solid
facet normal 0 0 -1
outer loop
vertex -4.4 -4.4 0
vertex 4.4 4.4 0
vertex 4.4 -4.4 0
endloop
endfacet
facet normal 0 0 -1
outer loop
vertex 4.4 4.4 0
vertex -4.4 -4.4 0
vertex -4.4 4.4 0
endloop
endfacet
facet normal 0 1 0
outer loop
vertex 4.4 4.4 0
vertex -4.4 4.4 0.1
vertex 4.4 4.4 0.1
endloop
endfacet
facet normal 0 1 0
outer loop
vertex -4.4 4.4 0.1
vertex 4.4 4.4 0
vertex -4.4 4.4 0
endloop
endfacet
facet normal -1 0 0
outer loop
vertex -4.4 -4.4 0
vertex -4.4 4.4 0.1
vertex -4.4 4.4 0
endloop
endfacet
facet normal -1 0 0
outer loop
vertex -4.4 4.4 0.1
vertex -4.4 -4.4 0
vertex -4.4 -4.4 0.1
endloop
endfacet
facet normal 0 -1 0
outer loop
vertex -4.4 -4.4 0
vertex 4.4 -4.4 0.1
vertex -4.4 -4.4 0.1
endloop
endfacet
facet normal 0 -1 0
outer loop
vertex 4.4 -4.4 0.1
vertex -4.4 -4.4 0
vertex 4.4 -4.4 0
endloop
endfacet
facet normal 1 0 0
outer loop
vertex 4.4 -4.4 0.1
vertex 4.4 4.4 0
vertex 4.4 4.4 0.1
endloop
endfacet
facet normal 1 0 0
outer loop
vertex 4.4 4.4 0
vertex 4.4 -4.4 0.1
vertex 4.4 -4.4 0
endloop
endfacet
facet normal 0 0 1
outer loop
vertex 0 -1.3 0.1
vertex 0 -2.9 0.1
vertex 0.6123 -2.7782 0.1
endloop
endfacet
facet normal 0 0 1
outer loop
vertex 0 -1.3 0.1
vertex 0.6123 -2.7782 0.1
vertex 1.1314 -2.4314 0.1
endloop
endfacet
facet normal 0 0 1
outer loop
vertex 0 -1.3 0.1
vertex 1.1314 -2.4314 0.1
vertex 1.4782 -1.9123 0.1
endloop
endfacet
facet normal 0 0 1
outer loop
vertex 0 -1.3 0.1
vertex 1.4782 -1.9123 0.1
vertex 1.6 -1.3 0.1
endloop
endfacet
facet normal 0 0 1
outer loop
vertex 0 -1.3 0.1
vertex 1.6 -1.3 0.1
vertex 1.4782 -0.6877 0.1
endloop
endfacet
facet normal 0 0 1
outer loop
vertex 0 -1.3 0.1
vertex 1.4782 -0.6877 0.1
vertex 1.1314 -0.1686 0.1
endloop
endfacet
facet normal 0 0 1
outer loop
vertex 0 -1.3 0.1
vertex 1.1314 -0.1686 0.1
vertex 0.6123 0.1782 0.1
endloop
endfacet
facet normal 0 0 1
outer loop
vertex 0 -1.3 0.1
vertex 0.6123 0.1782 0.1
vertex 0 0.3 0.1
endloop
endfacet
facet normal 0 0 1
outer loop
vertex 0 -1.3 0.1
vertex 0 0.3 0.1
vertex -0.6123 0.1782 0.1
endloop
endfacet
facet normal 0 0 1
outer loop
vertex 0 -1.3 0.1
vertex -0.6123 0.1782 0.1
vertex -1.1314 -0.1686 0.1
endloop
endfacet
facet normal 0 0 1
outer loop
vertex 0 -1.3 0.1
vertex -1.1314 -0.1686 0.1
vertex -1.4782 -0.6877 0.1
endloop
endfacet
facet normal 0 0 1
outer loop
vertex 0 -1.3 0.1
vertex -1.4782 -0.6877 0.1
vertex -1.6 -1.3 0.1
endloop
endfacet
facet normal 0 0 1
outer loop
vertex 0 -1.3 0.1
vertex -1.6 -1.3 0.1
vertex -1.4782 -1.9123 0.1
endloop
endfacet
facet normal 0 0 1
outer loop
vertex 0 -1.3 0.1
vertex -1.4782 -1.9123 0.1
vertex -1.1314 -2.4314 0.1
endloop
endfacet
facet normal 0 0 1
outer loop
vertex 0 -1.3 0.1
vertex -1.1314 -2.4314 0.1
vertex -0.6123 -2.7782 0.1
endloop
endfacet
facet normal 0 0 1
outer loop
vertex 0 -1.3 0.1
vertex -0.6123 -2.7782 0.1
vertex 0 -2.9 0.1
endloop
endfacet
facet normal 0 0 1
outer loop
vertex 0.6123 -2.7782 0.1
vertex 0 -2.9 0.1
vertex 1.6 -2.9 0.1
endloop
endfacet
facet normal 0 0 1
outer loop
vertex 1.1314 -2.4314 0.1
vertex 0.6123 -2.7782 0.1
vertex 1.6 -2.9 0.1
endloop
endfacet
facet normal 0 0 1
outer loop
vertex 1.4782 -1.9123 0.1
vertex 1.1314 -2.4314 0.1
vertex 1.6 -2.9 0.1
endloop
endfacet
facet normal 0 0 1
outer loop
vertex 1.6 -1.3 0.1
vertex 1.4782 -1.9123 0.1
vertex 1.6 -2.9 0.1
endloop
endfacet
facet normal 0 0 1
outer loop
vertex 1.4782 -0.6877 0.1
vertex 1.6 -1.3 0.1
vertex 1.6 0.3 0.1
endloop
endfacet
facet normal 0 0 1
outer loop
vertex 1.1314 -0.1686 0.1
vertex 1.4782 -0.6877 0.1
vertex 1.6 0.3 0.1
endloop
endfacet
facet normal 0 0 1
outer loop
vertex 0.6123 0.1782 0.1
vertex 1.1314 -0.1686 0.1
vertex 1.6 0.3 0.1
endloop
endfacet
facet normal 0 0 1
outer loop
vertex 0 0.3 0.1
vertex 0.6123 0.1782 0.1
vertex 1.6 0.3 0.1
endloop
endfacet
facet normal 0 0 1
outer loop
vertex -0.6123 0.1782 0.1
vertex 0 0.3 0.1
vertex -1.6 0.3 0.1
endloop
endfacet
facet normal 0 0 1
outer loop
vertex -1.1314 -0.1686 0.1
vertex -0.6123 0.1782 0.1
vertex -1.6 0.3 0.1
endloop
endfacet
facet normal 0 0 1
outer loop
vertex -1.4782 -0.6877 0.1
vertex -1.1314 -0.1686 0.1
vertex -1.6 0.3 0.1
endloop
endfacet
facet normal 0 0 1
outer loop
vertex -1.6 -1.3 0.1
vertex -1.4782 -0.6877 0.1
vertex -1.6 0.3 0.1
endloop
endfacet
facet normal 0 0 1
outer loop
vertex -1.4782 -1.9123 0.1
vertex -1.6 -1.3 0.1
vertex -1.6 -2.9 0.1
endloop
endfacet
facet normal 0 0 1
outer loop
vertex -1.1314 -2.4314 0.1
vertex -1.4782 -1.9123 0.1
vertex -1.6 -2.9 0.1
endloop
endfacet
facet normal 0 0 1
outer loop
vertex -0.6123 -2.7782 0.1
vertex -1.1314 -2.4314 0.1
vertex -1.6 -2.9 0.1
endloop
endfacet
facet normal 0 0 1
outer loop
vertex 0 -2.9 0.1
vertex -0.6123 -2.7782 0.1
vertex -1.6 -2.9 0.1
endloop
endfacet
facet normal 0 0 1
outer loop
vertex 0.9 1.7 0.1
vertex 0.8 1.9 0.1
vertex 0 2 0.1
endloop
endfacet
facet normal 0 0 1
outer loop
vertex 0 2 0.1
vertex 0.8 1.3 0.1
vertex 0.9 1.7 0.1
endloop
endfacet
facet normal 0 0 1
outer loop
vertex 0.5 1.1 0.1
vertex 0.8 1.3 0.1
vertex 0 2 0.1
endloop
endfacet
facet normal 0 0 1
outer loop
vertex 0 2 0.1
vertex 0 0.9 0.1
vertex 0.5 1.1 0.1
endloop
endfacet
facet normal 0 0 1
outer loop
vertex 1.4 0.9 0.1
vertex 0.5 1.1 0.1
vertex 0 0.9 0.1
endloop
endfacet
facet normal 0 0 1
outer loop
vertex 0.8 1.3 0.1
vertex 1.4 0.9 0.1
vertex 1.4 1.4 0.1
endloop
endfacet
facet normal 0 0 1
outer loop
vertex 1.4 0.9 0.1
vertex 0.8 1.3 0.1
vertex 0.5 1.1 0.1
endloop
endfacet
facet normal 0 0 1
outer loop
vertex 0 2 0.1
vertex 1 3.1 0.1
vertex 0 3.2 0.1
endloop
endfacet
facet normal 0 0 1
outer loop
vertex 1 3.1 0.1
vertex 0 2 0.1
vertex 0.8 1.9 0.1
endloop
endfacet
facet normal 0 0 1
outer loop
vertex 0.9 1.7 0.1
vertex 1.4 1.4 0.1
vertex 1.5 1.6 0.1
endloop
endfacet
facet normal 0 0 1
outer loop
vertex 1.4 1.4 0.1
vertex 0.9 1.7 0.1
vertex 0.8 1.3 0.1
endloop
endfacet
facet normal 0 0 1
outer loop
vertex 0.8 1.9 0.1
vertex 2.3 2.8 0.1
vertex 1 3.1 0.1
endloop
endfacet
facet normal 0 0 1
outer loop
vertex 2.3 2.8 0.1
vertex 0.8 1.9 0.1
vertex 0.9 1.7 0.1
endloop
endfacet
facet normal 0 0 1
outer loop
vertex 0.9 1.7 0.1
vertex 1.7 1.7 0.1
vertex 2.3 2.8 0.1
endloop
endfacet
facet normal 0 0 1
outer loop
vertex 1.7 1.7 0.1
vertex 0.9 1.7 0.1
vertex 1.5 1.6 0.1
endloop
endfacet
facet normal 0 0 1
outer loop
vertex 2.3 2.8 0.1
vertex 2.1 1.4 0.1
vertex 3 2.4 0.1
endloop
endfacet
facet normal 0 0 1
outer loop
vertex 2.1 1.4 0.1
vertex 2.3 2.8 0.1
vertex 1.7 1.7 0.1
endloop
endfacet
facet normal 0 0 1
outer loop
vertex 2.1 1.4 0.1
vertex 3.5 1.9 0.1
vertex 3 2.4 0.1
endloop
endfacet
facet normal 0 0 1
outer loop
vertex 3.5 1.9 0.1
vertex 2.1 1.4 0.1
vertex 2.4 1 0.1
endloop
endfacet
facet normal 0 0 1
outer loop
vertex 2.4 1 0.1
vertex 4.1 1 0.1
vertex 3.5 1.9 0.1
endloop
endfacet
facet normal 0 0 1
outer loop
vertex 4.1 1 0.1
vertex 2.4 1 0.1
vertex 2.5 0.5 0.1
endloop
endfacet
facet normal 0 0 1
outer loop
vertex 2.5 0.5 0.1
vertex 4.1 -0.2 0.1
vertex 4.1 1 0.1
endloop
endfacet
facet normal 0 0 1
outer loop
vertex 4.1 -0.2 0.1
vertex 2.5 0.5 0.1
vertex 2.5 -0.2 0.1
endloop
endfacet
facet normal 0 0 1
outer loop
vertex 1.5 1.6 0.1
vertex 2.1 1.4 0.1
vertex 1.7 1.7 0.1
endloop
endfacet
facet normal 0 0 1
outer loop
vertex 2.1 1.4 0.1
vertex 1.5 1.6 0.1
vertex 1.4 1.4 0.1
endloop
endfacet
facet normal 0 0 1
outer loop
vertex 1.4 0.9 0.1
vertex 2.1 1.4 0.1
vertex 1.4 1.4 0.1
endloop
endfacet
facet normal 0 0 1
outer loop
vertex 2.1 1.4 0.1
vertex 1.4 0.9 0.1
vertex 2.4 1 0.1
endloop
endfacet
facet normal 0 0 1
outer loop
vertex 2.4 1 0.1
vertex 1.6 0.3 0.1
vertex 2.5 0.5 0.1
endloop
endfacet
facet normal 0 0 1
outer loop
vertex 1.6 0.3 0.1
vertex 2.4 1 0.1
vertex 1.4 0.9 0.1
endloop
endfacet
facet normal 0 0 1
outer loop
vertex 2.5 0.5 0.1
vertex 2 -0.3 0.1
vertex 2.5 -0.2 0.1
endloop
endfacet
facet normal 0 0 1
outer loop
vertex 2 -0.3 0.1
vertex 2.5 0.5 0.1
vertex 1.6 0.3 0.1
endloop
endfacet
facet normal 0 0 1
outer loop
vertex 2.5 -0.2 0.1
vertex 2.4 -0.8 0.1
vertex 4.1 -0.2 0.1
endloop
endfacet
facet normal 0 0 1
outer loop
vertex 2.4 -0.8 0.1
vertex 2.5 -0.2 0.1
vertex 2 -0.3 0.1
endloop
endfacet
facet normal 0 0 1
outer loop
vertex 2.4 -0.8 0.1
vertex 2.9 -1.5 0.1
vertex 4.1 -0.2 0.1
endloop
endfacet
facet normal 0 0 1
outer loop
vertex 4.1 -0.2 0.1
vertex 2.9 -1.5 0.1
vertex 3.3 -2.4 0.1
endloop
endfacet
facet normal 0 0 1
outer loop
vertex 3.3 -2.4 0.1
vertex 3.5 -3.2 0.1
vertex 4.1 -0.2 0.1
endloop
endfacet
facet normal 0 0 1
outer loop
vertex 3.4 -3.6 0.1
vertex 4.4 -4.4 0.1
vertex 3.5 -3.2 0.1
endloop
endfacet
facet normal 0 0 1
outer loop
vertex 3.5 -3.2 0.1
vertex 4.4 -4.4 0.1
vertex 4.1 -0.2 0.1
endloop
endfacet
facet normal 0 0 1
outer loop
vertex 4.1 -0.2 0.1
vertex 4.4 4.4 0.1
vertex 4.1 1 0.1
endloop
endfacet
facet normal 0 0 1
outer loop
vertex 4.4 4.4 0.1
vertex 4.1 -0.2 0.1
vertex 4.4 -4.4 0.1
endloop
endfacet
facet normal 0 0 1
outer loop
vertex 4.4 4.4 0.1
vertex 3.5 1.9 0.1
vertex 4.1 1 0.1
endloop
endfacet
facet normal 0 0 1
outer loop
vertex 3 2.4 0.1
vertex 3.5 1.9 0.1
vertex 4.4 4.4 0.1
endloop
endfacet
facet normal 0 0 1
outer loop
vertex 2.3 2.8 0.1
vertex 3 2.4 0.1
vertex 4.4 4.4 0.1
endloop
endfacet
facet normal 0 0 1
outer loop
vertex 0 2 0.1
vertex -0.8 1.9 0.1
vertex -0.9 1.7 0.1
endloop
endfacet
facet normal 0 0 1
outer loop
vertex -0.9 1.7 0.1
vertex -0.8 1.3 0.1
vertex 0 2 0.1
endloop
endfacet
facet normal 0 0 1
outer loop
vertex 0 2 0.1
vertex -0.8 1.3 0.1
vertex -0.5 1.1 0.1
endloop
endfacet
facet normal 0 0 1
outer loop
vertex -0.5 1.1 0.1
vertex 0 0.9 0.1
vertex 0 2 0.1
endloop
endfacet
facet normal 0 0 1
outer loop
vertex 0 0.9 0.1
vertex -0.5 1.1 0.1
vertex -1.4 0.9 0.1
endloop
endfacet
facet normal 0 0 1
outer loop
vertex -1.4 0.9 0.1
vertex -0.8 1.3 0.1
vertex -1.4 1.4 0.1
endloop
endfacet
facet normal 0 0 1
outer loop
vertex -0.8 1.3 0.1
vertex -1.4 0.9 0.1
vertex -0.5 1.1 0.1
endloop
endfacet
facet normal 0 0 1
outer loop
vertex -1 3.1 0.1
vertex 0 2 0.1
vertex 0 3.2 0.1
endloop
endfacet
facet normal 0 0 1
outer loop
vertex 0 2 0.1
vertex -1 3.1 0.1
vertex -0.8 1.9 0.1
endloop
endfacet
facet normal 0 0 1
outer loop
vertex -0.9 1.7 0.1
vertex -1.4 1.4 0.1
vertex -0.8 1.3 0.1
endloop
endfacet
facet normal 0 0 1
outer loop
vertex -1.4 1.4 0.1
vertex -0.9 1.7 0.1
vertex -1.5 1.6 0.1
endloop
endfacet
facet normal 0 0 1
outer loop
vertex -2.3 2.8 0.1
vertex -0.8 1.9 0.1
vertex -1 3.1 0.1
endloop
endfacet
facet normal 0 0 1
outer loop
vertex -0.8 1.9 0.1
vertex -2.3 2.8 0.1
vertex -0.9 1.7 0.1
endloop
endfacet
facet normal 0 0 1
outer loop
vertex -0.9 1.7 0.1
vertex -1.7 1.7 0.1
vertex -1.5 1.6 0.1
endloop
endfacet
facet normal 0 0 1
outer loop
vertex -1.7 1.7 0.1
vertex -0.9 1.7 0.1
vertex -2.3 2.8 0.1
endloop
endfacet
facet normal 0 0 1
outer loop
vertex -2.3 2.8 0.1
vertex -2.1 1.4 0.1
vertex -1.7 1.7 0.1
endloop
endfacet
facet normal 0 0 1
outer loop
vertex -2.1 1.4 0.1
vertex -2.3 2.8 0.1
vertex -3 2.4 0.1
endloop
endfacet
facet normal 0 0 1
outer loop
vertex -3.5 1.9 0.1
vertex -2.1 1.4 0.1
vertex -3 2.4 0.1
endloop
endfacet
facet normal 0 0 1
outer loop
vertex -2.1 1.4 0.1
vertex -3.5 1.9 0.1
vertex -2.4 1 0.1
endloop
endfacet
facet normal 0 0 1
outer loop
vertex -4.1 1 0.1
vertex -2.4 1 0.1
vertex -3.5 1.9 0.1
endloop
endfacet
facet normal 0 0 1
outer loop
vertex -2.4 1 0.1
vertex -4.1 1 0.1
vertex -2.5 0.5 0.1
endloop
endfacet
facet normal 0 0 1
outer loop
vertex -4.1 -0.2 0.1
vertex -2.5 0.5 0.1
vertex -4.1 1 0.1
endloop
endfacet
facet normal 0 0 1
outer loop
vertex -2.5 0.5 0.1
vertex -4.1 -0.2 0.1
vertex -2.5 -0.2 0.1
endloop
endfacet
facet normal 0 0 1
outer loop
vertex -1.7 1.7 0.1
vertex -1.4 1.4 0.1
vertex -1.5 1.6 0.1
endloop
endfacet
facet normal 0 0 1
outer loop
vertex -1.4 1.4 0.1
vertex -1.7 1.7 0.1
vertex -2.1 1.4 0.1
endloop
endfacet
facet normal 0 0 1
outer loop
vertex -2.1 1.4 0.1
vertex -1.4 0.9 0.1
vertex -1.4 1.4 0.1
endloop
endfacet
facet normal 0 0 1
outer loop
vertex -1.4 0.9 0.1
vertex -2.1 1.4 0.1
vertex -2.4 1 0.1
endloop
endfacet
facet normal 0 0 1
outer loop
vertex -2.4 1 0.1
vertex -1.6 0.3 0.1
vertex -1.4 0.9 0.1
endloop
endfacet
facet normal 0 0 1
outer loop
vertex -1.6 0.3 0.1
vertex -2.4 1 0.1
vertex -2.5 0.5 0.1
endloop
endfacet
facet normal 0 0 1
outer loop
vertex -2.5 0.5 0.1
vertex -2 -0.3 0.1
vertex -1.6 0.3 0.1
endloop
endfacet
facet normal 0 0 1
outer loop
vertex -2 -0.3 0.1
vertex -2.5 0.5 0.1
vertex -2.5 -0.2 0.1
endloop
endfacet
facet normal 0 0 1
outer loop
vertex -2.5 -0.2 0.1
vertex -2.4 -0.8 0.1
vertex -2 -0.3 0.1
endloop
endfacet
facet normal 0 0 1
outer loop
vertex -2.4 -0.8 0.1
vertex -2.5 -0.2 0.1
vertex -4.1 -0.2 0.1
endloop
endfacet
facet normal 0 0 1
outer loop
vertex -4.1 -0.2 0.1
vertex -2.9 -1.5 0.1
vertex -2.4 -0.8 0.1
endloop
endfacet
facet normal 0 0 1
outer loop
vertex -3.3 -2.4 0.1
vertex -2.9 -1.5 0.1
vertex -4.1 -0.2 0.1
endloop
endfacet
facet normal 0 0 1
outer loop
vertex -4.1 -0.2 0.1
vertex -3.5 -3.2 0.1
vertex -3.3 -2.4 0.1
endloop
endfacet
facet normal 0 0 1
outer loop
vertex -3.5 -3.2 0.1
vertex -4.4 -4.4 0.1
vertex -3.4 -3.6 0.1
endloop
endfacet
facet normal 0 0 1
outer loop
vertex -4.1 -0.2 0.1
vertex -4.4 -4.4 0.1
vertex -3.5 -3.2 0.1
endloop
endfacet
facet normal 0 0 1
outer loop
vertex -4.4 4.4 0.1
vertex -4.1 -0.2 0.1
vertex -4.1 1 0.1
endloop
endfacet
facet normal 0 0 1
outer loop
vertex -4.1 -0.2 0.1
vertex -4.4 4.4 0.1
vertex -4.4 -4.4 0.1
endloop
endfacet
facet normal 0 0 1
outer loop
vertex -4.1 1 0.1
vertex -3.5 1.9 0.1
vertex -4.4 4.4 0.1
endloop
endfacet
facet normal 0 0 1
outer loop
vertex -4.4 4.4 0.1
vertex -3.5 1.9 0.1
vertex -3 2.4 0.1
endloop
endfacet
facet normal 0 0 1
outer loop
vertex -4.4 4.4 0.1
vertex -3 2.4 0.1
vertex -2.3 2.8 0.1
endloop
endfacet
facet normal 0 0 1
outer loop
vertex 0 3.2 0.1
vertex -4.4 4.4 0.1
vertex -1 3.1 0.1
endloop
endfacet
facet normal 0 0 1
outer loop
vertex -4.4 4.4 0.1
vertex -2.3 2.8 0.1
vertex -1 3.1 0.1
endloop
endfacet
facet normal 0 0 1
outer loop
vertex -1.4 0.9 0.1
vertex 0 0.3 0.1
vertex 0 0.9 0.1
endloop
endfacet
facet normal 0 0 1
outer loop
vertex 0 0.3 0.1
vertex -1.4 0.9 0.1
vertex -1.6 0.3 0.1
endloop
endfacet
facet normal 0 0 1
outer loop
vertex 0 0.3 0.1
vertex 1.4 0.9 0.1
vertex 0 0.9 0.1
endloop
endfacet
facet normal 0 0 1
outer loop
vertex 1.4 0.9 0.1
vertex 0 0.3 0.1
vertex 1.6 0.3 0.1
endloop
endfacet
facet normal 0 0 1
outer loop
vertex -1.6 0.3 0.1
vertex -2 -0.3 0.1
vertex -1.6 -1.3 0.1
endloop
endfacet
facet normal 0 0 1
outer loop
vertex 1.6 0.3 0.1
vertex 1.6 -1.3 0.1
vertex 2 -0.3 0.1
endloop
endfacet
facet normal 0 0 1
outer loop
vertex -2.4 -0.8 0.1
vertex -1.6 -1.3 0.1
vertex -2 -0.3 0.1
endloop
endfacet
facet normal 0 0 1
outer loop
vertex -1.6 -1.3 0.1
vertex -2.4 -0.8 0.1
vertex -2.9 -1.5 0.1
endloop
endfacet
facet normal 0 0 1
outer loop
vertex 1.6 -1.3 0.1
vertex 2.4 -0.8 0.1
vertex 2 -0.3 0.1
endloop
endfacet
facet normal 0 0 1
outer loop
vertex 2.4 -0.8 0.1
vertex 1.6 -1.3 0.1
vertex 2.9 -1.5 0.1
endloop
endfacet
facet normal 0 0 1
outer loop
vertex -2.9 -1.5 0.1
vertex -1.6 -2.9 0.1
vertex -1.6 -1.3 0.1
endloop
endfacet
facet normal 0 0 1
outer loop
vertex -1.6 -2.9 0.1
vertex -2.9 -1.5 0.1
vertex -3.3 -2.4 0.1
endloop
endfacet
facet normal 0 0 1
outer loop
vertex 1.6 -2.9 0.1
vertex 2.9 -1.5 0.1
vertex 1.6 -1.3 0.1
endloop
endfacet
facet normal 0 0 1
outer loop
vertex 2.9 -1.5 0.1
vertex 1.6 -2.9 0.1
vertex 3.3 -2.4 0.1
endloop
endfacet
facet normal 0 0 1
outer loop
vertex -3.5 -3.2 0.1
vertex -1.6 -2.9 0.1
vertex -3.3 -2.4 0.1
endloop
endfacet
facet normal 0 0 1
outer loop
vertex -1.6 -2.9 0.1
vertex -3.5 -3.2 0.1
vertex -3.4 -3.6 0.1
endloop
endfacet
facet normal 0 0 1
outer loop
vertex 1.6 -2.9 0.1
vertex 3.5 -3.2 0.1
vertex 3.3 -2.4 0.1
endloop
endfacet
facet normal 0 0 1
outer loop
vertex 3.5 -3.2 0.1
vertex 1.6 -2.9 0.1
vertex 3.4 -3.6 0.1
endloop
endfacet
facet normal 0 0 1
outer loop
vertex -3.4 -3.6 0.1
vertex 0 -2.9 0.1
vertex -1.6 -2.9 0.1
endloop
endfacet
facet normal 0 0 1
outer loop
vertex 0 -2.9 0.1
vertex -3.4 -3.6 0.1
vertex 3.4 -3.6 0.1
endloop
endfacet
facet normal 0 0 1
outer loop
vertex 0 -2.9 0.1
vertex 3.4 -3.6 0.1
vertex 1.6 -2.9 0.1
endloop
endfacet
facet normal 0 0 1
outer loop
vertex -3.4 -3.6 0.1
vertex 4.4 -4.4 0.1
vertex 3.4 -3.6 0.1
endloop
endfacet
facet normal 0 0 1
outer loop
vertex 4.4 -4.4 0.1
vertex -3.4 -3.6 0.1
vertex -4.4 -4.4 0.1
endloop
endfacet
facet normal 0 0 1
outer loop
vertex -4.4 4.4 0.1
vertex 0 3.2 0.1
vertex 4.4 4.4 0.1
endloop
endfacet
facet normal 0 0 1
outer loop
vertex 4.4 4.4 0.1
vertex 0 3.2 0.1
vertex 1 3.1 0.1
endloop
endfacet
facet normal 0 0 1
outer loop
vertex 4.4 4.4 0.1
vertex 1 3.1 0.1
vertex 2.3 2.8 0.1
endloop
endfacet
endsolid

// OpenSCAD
// file: ../p/4-4edge.scad
use <../lib.scad>
$fa=1; $fs=0.2;
function ldraw_lib__4_4edge(realsolid=false) = [
// 0 Circle 1.0
// 0 Name: 4-4edge.dat
// 0 Author: James Jessiman
// 0 !LDRAW_ORG Primitive UPDATE 2017-01
// 0 !LICENSE Licensed under CC BY 2.0 and CC BY 4.0 : see CAreadme.txt
// 
// 0 BFC CERTIFY CCW
  [0,"BFC","CERTIFY"],
  [0,"BFC","CCW"],
// 
// 0 !HISTORY 1998-12-15 [PTadmin] Official Update 1998-10
// 0 !HISTORY 2005-12-28 [PTadmin] Official Update 2005-01
// 0 !HISTORY 2007-06-24 [PTadmin] Header formatted for Contributor Agreement
// 0 !HISTORY 2008-07-01 [PTadmin] Official Update 2008-01
// 0 !HISTORY 2017-01-15 [Steffen] BFCed
// 0 !HISTORY 2017-12-30 [PTadmin] Official Update 2017-01
// 
// 
// 2 24 1 0 0 0.9239 0 0.3827
  [2,24,1,0,0,0.9239,0,0.3827],
// 2 24 0.9239 0 0.3827 0.7071 0 0.7071
  [2,24,0.9239,0,0.3827,0.7071,0,0.7071],
// 2 24 0.7071 0 0.7071 0.3827 0 0.9239
  [2,24,0.7071,0,0.7071,0.3827,0,0.9239],
// 2 24 0.3827 0 0.9239 0 0 1
  [2,24,0.3827,0,0.9239,0,0,1],
// 2 24 0 0 1 -0.3827 0 0.9239
  [2,24,0,0,1,-0.3827,0,0.9239],
// 2 24 -0.3827 0 0.9239 -0.7071 0 0.7071
  [2,24,-0.3827,0,0.9239,-0.7071,0,0.7071],
// 2 24 -0.7071 0 0.7071 -0.9239 0 0.3827
  [2,24,-0.7071,0,0.7071,-0.9239,0,0.3827],
// 2 24 -0.9239 0 0.3827 -1 0 -0
  [2,24,-0.9239,0,0.3827,-1,0,-0],
// 2 24 -1 0 -0 -0.9239 0 -0.3827
  [2,24,-1,0,-0,-0.9239,0,-0.3827],
// 2 24 -0.9239 0 -0.3827 -0.7071 0 -0.7071
  [2,24,-0.9239,0,-0.3827,-0.7071,0,-0.7071],
// 2 24 -0.7071 0 -0.7071 -0.3827 0 -0.9239
  [2,24,-0.7071,0,-0.7071,-0.3827,0,-0.9239],
// 2 24 -0.3827 0 -0.9239 0 0 -1
  [2,24,-0.3827,0,-0.9239,0,0,-1],
// 2 24 0 0 -1 0.3827 0 -0.9239
  [2,24,0,0,-1,0.3827,0,-0.9239],
// 2 24 0.3827 0 -0.9239 0.7071 0 -0.7071
  [2,24,0.3827,0,-0.9239,0.7071,0,-0.7071],
// 2 24 0.7071 0 -0.7071 0.9239 0 -0.3827
  [2,24,0.7071,0,-0.7071,0.9239,0,-0.3827],
// 2 24 0.9239 0 -0.3827 1 0 0
  [2,24,0.9239,0,-0.3827,1,0,0],
];
module ldraw_lib__4_4edge(step=0, col=false, unit=2/5, alt=false, line=0.2, solid=!$preview)
    makepoly(ldraw_lib__4_4edge(solid), step=step, col=col, unit=unit, alt=alt, line=line, solid=solid);
ldraw_lib__4_4edge(line=0.2);
// file: ../p/4-4cyli.scad
use <../lib.scad>
$fa=1; $fs=0.2;
function ldraw_lib__4_4cyli(realsolid=false) = [
// 0 Cylinder 1.0
// 0 Name: 4-4cyli.dat
// 0 Author: James Jessiman
// 0 !LDRAW_ORG Primitive UPDATE 2005-01
// 0 !LICENSE Licensed under CC BY 2.0 and CC BY 4.0 : see CAreadme.txt
// 
// 0 BFC CERTIFY CCW
  [0,"BFC","CERTIFY"],
  [0,"BFC","CCW"],
// 
// 0 !HISTORY 1998-12-15 [PTadmin] Official Update 1998-10
// 0 !HISTORY 2002-03-23 [sbliss] Added BFC statement; merged headers from files in distributions LDraw 0.27 and Complete.
// 0 !HISTORY 2002-04-25 [PTadmin] Official Update 2002-02
// 0 !HISTORY 2004-12-14 [guyvivan] BFC CCW
// 0 !HISTORY 2005-12-28 [PTadmin] Official Update 2005-01
// 0 !HISTORY 2007-06-24 [PTadmin] Header formatted for Contributor Agreement
// 0 !HISTORY 2008-07-01 [PTadmin] Official Update 2008-01
// 
// 
// 4 16 1 1 0 0.9239 1 0.3827 0.9239 0 0.3827 1 0 0
  [4,16,1,1,0,0.9239,1,0.3827,0.9239,0,0.3827,1,0,0],
// 5 24 1 0 0 1 1 0 0.9239 0 0.3827 0.9239 0 -0.3827
  [5,24,1,0,0,1,1,0,0.9239,0,0.3827,0.9239,0,-0.3827],
// 4 16 0.9239 1 0.3827 0.7071 1 0.7071 0.7071 0 0.7071 0.9239 0 0.3827
  [4,16,0.9239,1,0.3827,0.7071,1,0.7071,0.7071,0,0.7071,0.9239,0,0.3827],
// 5 24 0.9239 0 0.3827 0.9239 1 0.3827 0.7071 0 0.7071 1 0 0
  [5,24,0.9239,0,0.3827,0.9239,1,0.3827,0.7071,0,0.7071,1,0,0],
// 4 16 0.7071 1 0.7071 0.3827 1 0.9239 0.3827 0 0.9239 0.7071 0 0.7071
  [4,16,0.7071,1,0.7071,0.3827,1,0.9239,0.3827,0,0.9239,0.7071,0,0.7071],
// 5 24 0.7071 0 0.7071 0.7071 1 0.7071 0.3827 0 0.9239 0.9239 0 0.3827
  [5,24,0.7071,0,0.7071,0.7071,1,0.7071,0.3827,0,0.9239,0.9239,0,0.3827],
// 4 16 0.3827 1 0.9239 0 1 1 0 0 1 0.3827 0 0.9239
  [4,16,0.3827,1,0.9239,0,1,1,0,0,1,0.3827,0,0.9239],
// 5 24 0.3827 0 0.9239 0.3827 1 0.9239 0 0 1 0.7071 0 0.7071
  [5,24,0.3827,0,0.9239,0.3827,1,0.9239,0,0,1,0.7071,0,0.7071],
// 4 16 0 1 1 -0.3827 1 0.9239 -0.3827 0 0.9239 0 0 1
  [4,16,0,1,1,-0.3827,1,0.9239,-0.3827,0,0.9239,0,0,1],
// 5 24 0 0 1 0 1 1 -0.3827 0 0.9239 0.3827 0 0.9239
  [5,24,0,0,1,0,1,1,-0.3827,0,0.9239,0.3827,0,0.9239],
// 4 16 -0.3827 1 0.9239 -0.7071 1 0.7071 -0.7071 0 0.7071 -0.3827 0 0.9239
  [4,16,-0.3827,1,0.9239,-0.7071,1,0.7071,-0.7071,0,0.7071,-0.3827,0,0.9239],
// 5 24 -0.3827 0 0.9239 -0.3827 1 0.9239 -0.7071 0 0.7071 0 0 1
  [5,24,-0.3827,0,0.9239,-0.3827,1,0.9239,-0.7071,0,0.7071,0,0,1],
// 4 16 -0.7071 1 0.7071 -0.9239 1 0.3827 -0.9239 0 0.3827 -0.7071 0 0.7071
  [4,16,-0.7071,1,0.7071,-0.9239,1,0.3827,-0.9239,0,0.3827,-0.7071,0,0.7071],
// 5 24 -0.7071 0 0.7071 -0.7071 1 0.7071 -0.9239 0 0.3827 -0.3827 0 0.9239
  [5,24,-0.7071,0,0.7071,-0.7071,1,0.7071,-0.9239,0,0.3827,-0.3827,0,0.9239],
// 4 16 -0.9239 1 0.3827 -1 1 0 -1 0 0 -0.9239 0 0.3827
  [4,16,-0.9239,1,0.3827,-1,1,0,-1,0,0,-0.9239,0,0.3827],
// 5 24 -0.9239 0 0.3827 -0.9239 1 0.3827 -1 0 0 -0.7071 0 0.7071
  [5,24,-0.9239,0,0.3827,-0.9239,1,0.3827,-1,0,0,-0.7071,0,0.7071],
// 4 16 -1 1 0 -0.9239 1 -0.3827 -0.9239 0 -0.3827 -1 0 0
  [4,16,-1,1,0,-0.9239,1,-0.3827,-0.9239,0,-0.3827,-1,0,0],
// 5 24 -1 0 0 -1 1 0 -0.9239 0 -0.3827 -0.9239 0 0.3827
  [5,24,-1,0,0,-1,1,0,-0.9239,0,-0.3827,-0.9239,0,0.3827],
// 4 16 -0.9239 1 -0.3827 -0.7071 1 -0.7071 -0.7071 0 -0.7071 -0.9239 0 -0.3827
  [4,16,-0.9239,1,-0.3827,-0.7071,1,-0.7071,-0.7071,0,-0.7071,-0.9239,0,-0.3827],
// 5 24 -0.9239 0 -0.3827 -0.9239 1 -0.3827 -0.7071 0 -0.7071 -1 0 0
  [5,24,-0.9239,0,-0.3827,-0.9239,1,-0.3827,-0.7071,0,-0.7071,-1,0,0],
// 4 16 -0.7071 1 -0.7071 -0.3827 1 -0.9239 -0.3827 0 -0.9239 -0.7071 0 -0.7071
  [4,16,-0.7071,1,-0.7071,-0.3827,1,-0.9239,-0.3827,0,-0.9239,-0.7071,0,-0.7071],
// 5 24 -0.7071 0 -0.7071 -0.7071 1 -0.7071 -0.3827 0 -0.9239 -0.9239 0 -0.3827
  [5,24,-0.7071,0,-0.7071,-0.7071,1,-0.7071,-0.3827,0,-0.9239,-0.9239,0,-0.3827],
// 4 16 -0.3827 1 -0.9239 0 1 -1 0 0 -1 -0.3827 0 -0.9239
  [4,16,-0.3827,1,-0.9239,0,1,-1,0,0,-1,-0.3827,0,-0.9239],
// 5 24 -0.3827 0 -0.9239 -0.3827 1 -0.9239 0 0 -1 -0.7071 0 -0.7071
  [5,24,-0.3827,0,-0.9239,-0.3827,1,-0.9239,0,0,-1,-0.7071,0,-0.7071],
// 4 16 0 1 -1 0.3827 1 -0.9239 0.3827 0 -0.9239 0 0 -1
  [4,16,0,1,-1,0.3827,1,-0.9239,0.3827,0,-0.9239,0,0,-1],
// 5 24 0 0 -1 0 1 -1 0.3827 0 -0.9239 -0.3827 0 -0.9239
  [5,24,0,0,-1,0,1,-1,0.3827,0,-0.9239,-0.3827,0,-0.9239],
// 4 16 0.3827 1 -0.9239 0.7071 1 -0.7071 0.7071 0 -0.7071 0.3827 0 -0.9239
  [4,16,0.3827,1,-0.9239,0.7071,1,-0.7071,0.7071,0,-0.7071,0.3827,0,-0.9239],
// 5 24 0.3827 0 -0.9239 0.3827 1 -0.9239 0.7071 0 -0.7071 0 0 -1
  [5,24,0.3827,0,-0.9239,0.3827,1,-0.9239,0.7071,0,-0.7071,0,0,-1],
// 4 16 0.7071 1 -0.7071 0.9239 1 -0.3827 0.9239 0 -0.3827 0.7071 0 -0.7071
  [4,16,0.7071,1,-0.7071,0.9239,1,-0.3827,0.9239,0,-0.3827,0.7071,0,-0.7071],
// 5 24 0.7071 0 -0.7071 0.7071 1 -0.7071 0.9239 0 -0.3827 0.3827 0 -0.9239
  [5,24,0.7071,0,-0.7071,0.7071,1,-0.7071,0.9239,0,-0.3827,0.3827,0,-0.9239],
// 4 16 0.9239 1 -0.3827 1 1 0 1 0 0 0.9239 0 -0.3827
  [4,16,0.9239,1,-0.3827,1,1,0,1,0,0,0.9239,0,-0.3827],
// 5 24 0.9239 0 -0.3827 0.9239 1 -0.3827 1 0 0 0.7071 0 -0.7071
  [5,24,0.9239,0,-0.3827,0.9239,1,-0.3827,1,0,0,0.7071,0,-0.7071],
// 0
];
module ldraw_lib__4_4cyli(step=0, col=false, unit=2/5, alt=false, line=0.2, solid=!$preview)
    makepoly(ldraw_lib__4_4cyli(solid), step=step, col=col, unit=unit, alt=alt, line=line, solid=solid);
ldraw_lib__4_4cyli(line=0.2);
// file: ../p/stud3.scad
use <../lib.scad>
use <4-4cyli.scad>
use <4-4disc.scad>
use <4-4edge.scad>
$fa=1; $fs=0.2;
function ldraw_lib__stud3(realsolid=false) = realsolid ? 
    [openscad(translate([0,0,-eps()], o=cylinder(4+eps(), r=4)),2)] : [
// 0 Stud Tube Solid
// 0 Name: stud3.dat
// 0 Author: James Jessiman
// 0 !LDRAW_ORG Primitive UPDATE 2012-01
// 0 !LICENSE Licensed under CC BY 2.0 and CC BY 4.0 : see CAreadme.txt
// 
// 0 BFC CERTIFY CCW
  [0,"BFC","CERTIFY"],
  [0,"BFC","CCW"],
// 
// 0 !HISTORY 2002-04-04 [sbliss] Modified for BFC compliance
// 0 !HISTORY 2002-04-25 [PTadmin] Official Update 2002-02
// 0 !HISTORY 2007-06-24 [PTadmin] Header formatted for Contributor Agreement
// 0 !HISTORY 2008-07-01 [PTadmin] Official Update 2008-01
// 0 !HISTORY 2012-02-16 [Philo] Changed to CCW
// 0 !HISTORY 2012-03-30 [PTadmin] Official Update 2012-01
// 
// 
// 1 16 0 -4 0 4 0 0 0 1 0 0 0 4 4-4edge.dat
  [1,16,0,-4,0,4,0,0,0,1,0,0,0,4, ldraw_lib__4_4edge(realsolid)],
// 1 16 0 0 0 4 0 0 0 1 0 0 0 4 4-4edge.dat
  [1,16,0,0,0,4,0,0,0,1,0,0,0,4, ldraw_lib__4_4edge(realsolid)],
// 1 16 0 -4 0 4 0 0 0 1 0 0 0 4 4-4disc.dat
  [1,16,0,-4,0,4,0,0,0,1,0,0,0,4, ldraw_lib__4_4disc(realsolid)],
// 1 16 0 -4 0 4 0 0 0 4 0 0 0 4 4-4cyli.dat
  [1,16,0,-4,0,4,0,0,0,4,0,0,0,4, ldraw_lib__4_4cyli(realsolid)],
];
module ldraw_lib__stud3(step=0, col=false, unit=2/5, alt=false, line=0.2, solid=!$preview)
    makepoly(ldraw_lib__stud3(solid), step=step, col=col, unit=unit, alt=alt, line=line, solid=solid);
ldraw_lib__stud3(line=0.2);
// file: ../p/stud.scad
use <../lib.scad>
use <4-4cyli.scad>
use <4-4disc.scad>
use <4-4edge.scad>
$fa=1; $fs=0.2;
function ldraw_lib__stud(realsolid=false) = realsolid ? 
    [openscad(translate([0,0,-eps()], o=cylinder(4+eps(), r=6)),2)] : [
// 0 Stud
// 0 Name: stud.dat
// 0 Author: James Jessiman
// 0 !LDRAW_ORG Primitive UPDATE 2012-01
// 0 !LICENSE Licensed under CC BY 2.0 and CC BY 4.0 : see CAreadme.txt
// 
// 0 BFC CERTIFY CCW
  [0,"BFC","CERTIFY"],
  [0,"BFC","CCW"],
// 
// 0 !HISTORY 2002-04-04 [sbliss] Modified for BFC compliance
// 0 !HISTORY 2002-04-25 [PTadmin] Official Update 2002-02
// 0 !HISTORY 2007-06-24 [PTadmin] Header formatted for Contributor Agreement
// 0 !HISTORY 2008-07-01 [PTadmin] Official Update 2008-01
// 0 !HISTORY 2012-02-16 [Philo] Changed to CCW
// 0 !HISTORY 2012-03-30 [PTadmin] Official Update 2012-01
// 
// 
// 1 16 0 0 0 6 0 0 0 1 0 0 0 6 4-4edge.dat
  [1,16,0,0,0,6,0,0,0,1,0,0,0,6, ldraw_lib__4_4edge(realsolid)],
// 1 16 0 -4 0 6 0 0 0 1 0 0 0 6 4-4edge.dat
  [1,16,0,-4,0,6,0,0,0,1,0,0,0,6, ldraw_lib__4_4edge(realsolid)],
// 1 16 0 0 0 6 0 0 0 -4 0 0 0 6 4-4cyli.dat
  [1,16,0,0,0,6,0,0,0,-4,0,0,0,6, ldraw_lib__4_4cyli(realsolid)],
// 1 16 0 -4 0 6 0 0 0 1 0 0 0 6 4-4disc.dat
  [1,16,0,-4,0,6,0,0,0,1,0,0,0,6, ldraw_lib__4_4disc(realsolid)],
];
module ldraw_lib__stud(step=0, col=false, unit=2/5, alt=false, line=0.2, solid=!$preview)
    makepoly(ldraw_lib__stud(solid), step=step, col=col, unit=unit, alt=alt, line=line, solid=solid);
ldraw_lib__stud(line=0.2);
// file: ../p/box5.scad
use <../lib.scad>
$fa=1; $fs=0.2;
function ldraw_lib__box5(realsolid=false) = [
// 0 Box with 5 Faces and All Edges
// 0 Name: box5.dat
// 0 Author: James Jessiman
// 0 !LDRAW_ORG Primitive UPDATE 2012-01
// 0 !LICENSE Licensed under CC BY 2.0 and CC BY 4.0 : see CAreadme.txt
// 
// 0 BFC CERTIFY CCW
  [0,"BFC","CERTIFY"],
  [0,"BFC","CCW"],
// 
// 0 !HISTORY 2002-04-03 [sbliss] Modified for BFC compliance
// 0 !HISTORY 2002-04-25 [PTadmin] Official Update 2002-02
// 0 !HISTORY 2007-06-24 [PTadmin] Header formatted for Contributor Agreement
// 0 !HISTORY 2008-07-01 [PTadmin] Official Update 2008-01
// 0 !HISTORY 2012-02-16 [Philo] Changed to CCW
// 0 !HISTORY 2012-03-30 [PTadmin] Official Update 2012-01
// 
// 
// 2 24 1 1 1 -1 1 1
  [2,24,1,1,1,-1,1,1],
// 2 24 -1 1 1 -1 1 -1
  [2,24,-1,1,1,-1,1,-1],
// 2 24 -1 1 -1 1 1 -1
  [2,24,-1,1,-1,1,1,-1],
// 2 24 1 1 -1 1 1 1
  [2,24,1,1,-1,1,1,1],
// 2 24 1 0 1 -1 0 1
  [2,24,1,0,1,-1,0,1],
// 2 24 -1 0 1 -1 0 -1
  [2,24,-1,0,1,-1,0,-1],
// 2 24 -1 0 -1 1 0 -1
  [2,24,-1,0,-1,1,0,-1],
// 2 24 1 0 -1 1 0 1
  [2,24,1,0,-1,1,0,1],
// 2 24 1 0 1 1 1 1
  [2,24,1,0,1,1,1,1],
// 2 24 -1 0 1 -1 1 1
  [2,24,-1,0,1,-1,1,1],
// 2 24 1 0 -1 1 1 -1
  [2,24,1,0,-1,1,1,-1],
// 2 24 -1 0 -1 -1 1 -1
  [2,24,-1,0,-1,-1,1,-1],
// 4 16 -1 1 1 1 1 1 1 1 -1 -1 1 -1
  [4,16,-1,1,1,1,1,1,1,1,-1,-1,1,-1],
// 4 16 -1 1 1 -1 0 1 1 0 1 1 1 1
  [4,16,-1,1,1,-1,0,1,1,0,1,1,1,1],
// 4 16 -1 1 -1 -1 0 -1 -1 0 1 -1 1 1
  [4,16,-1,1,-1,-1,0,-1,-1,0,1,-1,1,1],
// 4 16 1 1 -1 1 0 -1 -1 0 -1 -1 1 -1
  [4,16,1,1,-1,1,0,-1,-1,0,-1,-1,1,-1],
// 4 16 1 1 1 1 0 1 1 0 -1 1 1 -1
  [4,16,1,1,1,1,0,1,1,0,-1,1,1,-1],
];
module ldraw_lib__box5(step=0, col=false, unit=2/5, alt=false, line=0.2, solid=!$preview)
    makepoly(ldraw_lib__box5(solid), step=step, col=col, unit=unit, alt=alt, line=line, solid=solid);
ldraw_lib__box5(line=0.2);
// file: ../p/box4t.scad
use <../lib.scad>
$fa=1; $fs=0.2;
function ldraw_lib__box4t(realsolid=false) = [
// 0 Box with 4 Adjacent Faces and All Edges
// 0 Name: box4t.dat
// 0 Author: Tore Eriksson [Tore_Eriksson]
// 0 !LDRAW_ORG Primitive UPDATE 2003-02
// 0 !LICENSE Licensed under CC BY 2.0 and CC BY 4.0 : see CAreadme.txt
// 
// 0 BFC CERTIFY CCW
  [0,"BFC","CERTIFY"],
  [0,"BFC","CCW"],
// 
// 0 !HISTORY 1997-09-29 [PTadmin] Official Update 1997-15
// 0 !HISTORY 2002-08-31 [izanette] Modified with WINDZ for BFC compliance
// 0 !HISTORY 2003-08-01 [PTadmin] Official Update 2003-02
// 0 !HISTORY 2007-06-24 [PTadmin] Header formatted for Contributor Agreement
// 0 !HISTORY 2008-07-01 [PTadmin] Official Update 2008-01
// 
// 
// 2 24 1 1 1 -1 1 1
  [2,24,1,1,1,-1,1,1],
// 2 24 -1 1 1 -1 1 -1
  [2,24,-1,1,1,-1,1,-1],
// 2 24 -1 1 -1 1 1 -1
  [2,24,-1,1,-1,1,1,-1],
// 2 24 1 1 -1 1 1 1
  [2,24,1,1,-1,1,1,1],
// 2 24 1 0 1 -1 0 1
  [2,24,1,0,1,-1,0,1],
// 2 24 -1 0 1 -1 0 -1
  [2,24,-1,0,1,-1,0,-1],
// 2 24 -1 0 -1 1 0 -1
  [2,24,-1,0,-1,1,0,-1],
// 2 24 1 0 -1 1 0 1
  [2,24,1,0,-1,1,0,1],
// 2 24 1 0 1 1 1 1
  [2,24,1,0,1,1,1,1],
// 2 24 -1 0 1 -1 1 1
  [2,24,-1,0,1,-1,1,1],
// 2 24 1 0 -1 1 1 -1
  [2,24,1,0,-1,1,1,-1],
// 2 24 -1 0 -1 -1 1 -1
  [2,24,-1,0,-1,-1,1,-1],
// 4 16 1 1 1 1 1 -1 -1 1 -1 -1 1 1
  [4,16,1,1,1,1,1,-1,-1,1,-1,-1,1,1],
// 4 16 1 1 1 -1 1 1 -1 0 1 1 0 1
  [4,16,1,1,1,-1,1,1,-1,0,1,1,0,1],
// 4 16 -1 1 1 -1 1 -1 -1 0 -1 -1 0 1
  [4,16,-1,1,1,-1,1,-1,-1,0,-1,-1,0,1],
// 0 4 16 -1 1 -1 -1 0 -1 1 0 -1 1 1 -1
// 4 16 1 1 -1 1 1 1 1 0 1 1 0 -1
  [4,16,1,1,-1,1,1,1,1,0,1,1,0,-1],
// 0
];
module ldraw_lib__box4t(step=0, col=false, unit=2/5, alt=false, line=0.2, solid=!$preview)
    makepoly(ldraw_lib__box4t(solid), step=step, col=col, unit=unit, alt=alt, line=line, solid=solid);
ldraw_lib__box4t(line=0.2);
// file: s/3004s01.scad
use <../../lib.scad>
use <../../p/box4t.scad>
use <../../p/box5.scad>
use <../../p/stud.scad>
use <../../p/stud3.scad>
$fa=1; $fs=0.2;
function ldraw_lib__s__3004s01(realsolid=false) = [
// 0 ~Brick  1 x  2 without Front Face
// 0 Name: s\3004s01.dat
// 0 Author: James Jessiman
// 0 !LDRAW_ORG Subpart UPDATE 2003-03
// 0 !LICENSE Licensed under CC BY 2.0 and CC BY 4.0 : see CAreadme.txt
// 
// 0 BFC CERTIFY CCW
  [0,"BFC","CERTIFY"],
  [0,"BFC","CCW"],
// 
// 0 !HISTORY 2003-09-07 [jriley] Subfiling, BFC
// 0 !HISTORY 2003-12-19 [PTadmin] Official Update 2003-03
// 0 !HISTORY 2007-08-29 [PTadmin] Header formatted for Contributor Agreement
// 0 !HISTORY 2008-07-01 [PTadmin] Official Update 2008-01
// 
// 
// 1 16 0 4 0 1 0 0 0 -5 0 0 0 1 stud3.dat
  [1,16,0,4,0,1,0,0,0,-5,0,0,0,1, ldraw_lib__stud3(realsolid)],
// 0 BFC INVERTNEXT
  [0,"BFC","INVERTNEXT"],
// 1 16 0 24 0 16 0 0 0 -20 0 0 0 6 box5.dat
  [1,16,0,24,0,16,0,0,0,-20,0,0,0,6, ldraw_lib__box5(realsolid)],
// 4 16 20 24 10 16 24 6 -16 24 6 -20 24 10
  [4,16,20,24,10,16,24,6,-16,24,6,-20,24,10],
// 4 16 -20 24 10 -16 24 6 -16 24 -6 -20 24 -10
  [4,16,-20,24,10,-16,24,6,-16,24,-6,-20,24,-10],
// 4 16 -20 24 -10 -16 24 -6 16 24 -6 20 24 -10
  [4,16,-20,24,-10,-16,24,-6,16,24,-6,20,24,-10],
// 4 16 20 24 -10 16 24 -6 16 24 6 20 24 10
  [4,16,20,24,-10,16,24,-6,16,24,6,20,24,10],
// 1 16 0 24 0 20 0 0 0 -24 0 0 0 10 box4t.dat
  [1,16,0,24,0,20,0,0,0,-24,0,0,0,10, ldraw_lib__box4t(realsolid)],
// 1 16 10 0 0 1 0 0 0 1 0 0 0 1 stud.dat
  [1,16,10,0,0,1,0,0,0,1,0,0,0,1, ldraw_lib__stud(realsolid)],
// 1 16 -10 0 0 1 0 0 0 1 0 0 0 1 stud.dat
  [1,16,-10,0,0,1,0,0,0,1,0,0,0,1, ldraw_lib__stud(realsolid)],
// 0
];
module ldraw_lib__s__3004s01(step=0, col=false, unit=2/5, alt=false, line=0.2, solid=!$preview)
    makepoly(ldraw_lib__s__3004s01(solid), step=step, col=col, unit=unit, alt=alt, line=line, solid=solid);
ldraw_lib__s__3004s01(line=0.2);
// file: ../p/4-4ndis.scad
use <../lib.scad>
$fa=1; $fs=0.2;
function ldraw_lib__4_4ndis(realsolid=false) = [
// 0 Disc Negative 1.0
// 0 Name: 4-4ndis.dat
// 0 Author: James Jessiman
// 0 !LDRAW_ORG Primitive UPDATE 2012-01
// 0 !LICENSE Licensed under CC BY 2.0 and CC BY 4.0 : see CAreadme.txt
// 
// 0 BFC CERTIFY CCW
  [0,"BFC","CERTIFY"],
  [0,"BFC","CCW"],
// 
// 0 !HISTORY 2002-03-23 [sbliss] Added BFC statement; compacted code
// 0 !HISTORY 2002-04-25 [PTadmin] Official Update 2002-02
// 0 !HISTORY 2007-06-24 [PTadmin] Header formatted for Contributor Agreement
// 0 !HISTORY 2008-07-01 [PTadmin] Official Update 2008-01
// 0 !HISTORY 2012-02-16 [Philo] Changed to CCW
// 0 !HISTORY 2012-03-30 [PTadmin] Official Update 2012-01
// 
// 
// 3 16 0.9239 0 0.3827 1 0 0 1 0 1
  [3,16,0.9239,0,0.3827,1,0,0,1,0,1],
// 3 16 0.7071 0 0.7071 0.9239 0 0.3827 1 0 1
  [3,16,0.7071,0,0.7071,0.9239,0,0.3827,1,0,1],
// 3 16 0.3827 0 0.9239 0.7071 0 0.7071 1 0 1
  [3,16,0.3827,0,0.9239,0.7071,0,0.7071,1,0,1],
// 3 16 0 0 1 0.3827 0 0.9239 1 0 1
  [3,16,0,0,1,0.3827,0,0.9239,1,0,1],
// 3 16 -0.3827 0 0.9239 0 0 1 -1 0 1
  [3,16,-0.3827,0,0.9239,0,0,1,-1,0,1],
// 3 16 -0.7071 0 0.7071 -0.3827 0 0.9239 -1 0 1
  [3,16,-0.7071,0,0.7071,-0.3827,0,0.9239,-1,0,1],
// 3 16 -0.9239 0 0.3827 -0.7071 0 0.7071 -1 0 1
  [3,16,-0.9239,0,0.3827,-0.7071,0,0.7071,-1,0,1],
// 3 16 -1 0 0 -0.9239 0 0.3827 -1 0 1
  [3,16,-1,0,0,-0.9239,0,0.3827,-1,0,1],
// 3 16 -0.9239 0 -0.3827 -1 0 0 -1 0 -1
  [3,16,-0.9239,0,-0.3827,-1,0,0,-1,0,-1],
// 3 16 -0.7071 0 -0.7071 -0.9239 0 -0.3827 -1 0 -1
  [3,16,-0.7071,0,-0.7071,-0.9239,0,-0.3827,-1,0,-1],
// 3 16 -0.3827 0 -0.9239 -0.7071 0 -0.7071 -1 0 -1
  [3,16,-0.3827,0,-0.9239,-0.7071,0,-0.7071,-1,0,-1],
// 3 16 0 0 -1 -0.3827 0 -0.9239 -1 0 -1
  [3,16,0,0,-1,-0.3827,0,-0.9239,-1,0,-1],
// 3 16 0.3827 0 -0.9239 0 0 -1 1 0 -1
  [3,16,0.3827,0,-0.9239,0,0,-1,1,0,-1],
// 3 16 0.7071 0 -0.7071 0.3827 0 -0.9239 1 0 -1
  [3,16,0.7071,0,-0.7071,0.3827,0,-0.9239,1,0,-1],
// 3 16 0.9239 0 -0.3827 0.7071 0 -0.7071 1 0 -1
  [3,16,0.9239,0,-0.3827,0.7071,0,-0.7071,1,0,-1],
// 3 16 1 0 0 0.9239 0 -0.3827 1 0 -1
  [3,16,1,0,0,0.9239,0,-0.3827,1,0,-1],
];
module ldraw_lib__4_4ndis(step=0, col=false, unit=2/5, alt=false, line=0.2, solid=!$preview)
    makepoly(ldraw_lib__4_4ndis(solid), step=step, col=col, unit=unit, alt=alt, line=line, solid=solid);
ldraw_lib__4_4ndis(line=0.2);
// file: ../p/4-4disc.scad
use <../lib.scad>
$fa=1; $fs=0.2;
function ldraw_lib__4_4disc(realsolid=false) = [
// 0 Disc 1.0
// 0 Name: 4-4disc.dat
// 0 Author: James Jessiman
// 0 !LDRAW_ORG Primitive UPDATE 2002-02
// 0 !LICENSE Licensed under CC BY 2.0 and CC BY 4.0 : see CAreadme.txt
// 
// 0 BFC CERTIFY CCW
  [0,"BFC","CERTIFY"],
  [0,"BFC","CCW"],
// 
// 0 !HISTORY 1998-12-15 [PTadmin] Official Update 1998-10
// 0 !HISTORY 2002-03-23 [sbliss] Added BFC statement
// 0 !HISTORY 2002-04-25 [PTadmin] Official Update 2002-02
// 0 !HISTORY 2007-06-24 [PTadmin] Header formatted for Contributor Agreement
// 0 !HISTORY 2008-07-01 [PTadmin] Official Update 2008-01
// 
// 
// 3 16 0 0 0 1 0 0 0.9239 0 0.3827
  [3,16,0,0,0,1,0,0,0.9239,0,0.3827],
// 3 16 0 0 0 0.9239 0 0.3827 0.7071 0 0.7071
  [3,16,0,0,0,0.9239,0,0.3827,0.7071,0,0.7071],
// 3 16 0 0 0 0.7071 0 0.7071 0.3827 0 0.9239
  [3,16,0,0,0,0.7071,0,0.7071,0.3827,0,0.9239],
// 3 16 0 0 0 0.3827 0 0.9239 0 0 1
  [3,16,0,0,0,0.3827,0,0.9239,0,0,1],
// 3 16 0 0 0 0 0 1 -0.3827 0 0.9239
  [3,16,0,0,0,0,0,1,-0.3827,0,0.9239],
// 3 16 0 0 0 -0.3827 0 0.9239 -0.7071 0 0.7071
  [3,16,0,0,0,-0.3827,0,0.9239,-0.7071,0,0.7071],
// 3 16 0 0 0 -0.7071 0 0.7071 -0.9239 0 0.3827
  [3,16,0,0,0,-0.7071,0,0.7071,-0.9239,0,0.3827],
// 3 16 0 0 0 -0.9239 0 0.3827 -1 0 -0
  [3,16,0,0,0,-0.9239,0,0.3827,-1,0,-0],
// 3 16 0 0 0 -1 0 -0 -0.9239 0 -0.3827
  [3,16,0,0,0,-1,0,-0,-0.9239,0,-0.3827],
// 3 16 0 0 0 -0.9239 0 -0.3827 -0.7071 0 -0.7071
  [3,16,0,0,0,-0.9239,0,-0.3827,-0.7071,0,-0.7071],
// 3 16 0 0 0 -0.7071 0 -0.7071 -0.3827 0 -0.9239
  [3,16,0,0,0,-0.7071,0,-0.7071,-0.3827,0,-0.9239],
// 3 16 0 0 0 -0.3827 0 -0.9239 0 0 -1
  [3,16,0,0,0,-0.3827,0,-0.9239,0,0,-1],
// 3 16 0 0 0 0 0 -1 0.3827 0 -0.9239
  [3,16,0,0,0,0,0,-1,0.3827,0,-0.9239],
// 3 16 0 0 0 0.3827 0 -0.9239 0.7071 0 -0.7071
  [3,16,0,0,0,0.3827,0,-0.9239,0.7071,0,-0.7071],
// 3 16 0 0 0 0.7071 0 -0.7071 0.9239 0 -0.3827
  [3,16,0,0,0,0.7071,0,-0.7071,0.9239,0,-0.3827],
// 3 16 0 0 0 0.9239 0 -0.3827 1 0 0
  [3,16,0,0,0,0.9239,0,-0.3827,1,0,0],
// 0
];
module ldraw_lib__4_4disc(step=0, col=false, unit=2/5, alt=false, line=0.2, solid=!$preview)
    makepoly(ldraw_lib__4_4disc(solid), step=step, col=col, unit=unit, alt=alt, line=line, solid=solid);
ldraw_lib__4_4disc(line=0.2);
// file: 3004.scad
use <../lib.scad>
use <s/3004s01.scad>
$fa=1; $fs=0.2;
function ldraw_lib__3004(realsolid=false) = [
// 0 Brick  1 x  2
// 0 Name: 3004.dat
// 0 Author: James Jessiman
// 0 !LDRAW_ORG Part UPDATE 2022-05
// 0 !LICENSE Licensed under CC BY 2.0 and CC BY 4.0 : see CAreadme.txt
// 
// 0 BFC CERTIFY CCW
  [0,"BFC","CERTIFY"],
  [0,"BFC","CCW"],
// 
// 0 !HISTORY 2001-10-26 [PTadmin] Official Update 2001-01
// 0 !HISTORY 2002-05-07 {unknown} BFC Certification
// 0 !HISTORY 2002-06-11 [PTadmin] Official Update 2002-03
// 0 !HISTORY 2007-05-07 [PTadmin] Header formatted for Contributor Agreement
// 0 !HISTORY 2008-07-01 [PTadmin] Official Update 2008-01
// 0 !HISTORY 2022-08-04 [MagFors] Using subfile
// 0 !HISTORY 2022-09-15 [PTadmin] Official Update 2022-05
// 
// 
// 1 16 0 0 0 1 0 0 0 1 0 0 0 1 s\3004s01.dat
  [1,16,0,0,0,1,0,0,0,1,0,0,0,1, ldraw_lib__s__3004s01(realsolid)],
// 4 16 -20 24 -10 20 24 -10 20 0 -10 -20 0 -10
  [4,16,-20,24,-10,20,24,-10,20,0,-10,-20,0,-10],
];
module ldraw_lib__3004(step=0, col=false, unit=2/5, alt=false, line=0.2, solid=!$preview)
    makepoly(ldraw_lib__3004(solid), step=step, col=col, unit=unit, alt=alt, line=line, solid=solid);
ldraw_lib__3004(line=0.2);
// file: ../p/box5-12.scad
use <../lib.scad>
$fa=1; $fs=0.2;
function ldraw_lib__box5_12(realsolid=false) = [
// 0 Box with 5 Faces without Any Edges
// 0 Name: box5-12.dat
// 0 Author: Chris Dee [cwdee]
// 0 !LDRAW_ORG Primitive UPDATE 2009-02
// 0 !LICENSE Licensed under CC BY 2.0 and CC BY 4.0 : see CAreadme.txt
// 
// 0 BFC CERTIFY CCW
  [0,"BFC","CERTIFY"],
  [0,"BFC","CCW"],
// 
// 0 !HISTORY 2009-09-03 [PTadmin] Official Update 2009-02
// 
// 
// 4 16 1 1 1 1 1 -1 -1 1 -1 -1 1 1
  [4,16,1,1,1,1,1,-1,-1,1,-1,-1,1,1],
// 4 16 -1 0 1 1 0 1 1 1 1 -1 1 1
  [4,16,-1,0,1,1,0,1,1,1,1,-1,1,1],
// 4 16 -1 0 -1 -1 0 1 -1 1 1 -1 1 -1
  [4,16,-1,0,-1,-1,0,1,-1,1,1,-1,1,-1],
// 4 16 1 0 -1 -1 0 -1 -1 1 -1 1 1 -1
  [4,16,1,0,-1,-1,0,-1,-1,1,-1,1,1,-1],
// 4 16 1 0 1 1 0 -1 1 1 -1 1 1 1
  [4,16,1,0,1,1,0,-1,1,1,-1,1,1,1],
// 0
];
module ldraw_lib__box5_12(step=0, col=false, unit=2/5, alt=false, line=0.2, solid=!$preview)
    makepoly(ldraw_lib__box5_12(solid), step=step, col=col, unit=unit, alt=alt, line=line, solid=solid);
ldraw_lib__box5_12(line=0.2);
// main file
use <../lib.scad>
use <../p/box5-12.scad>
use <s/3004p13s01.scad>
$fa=1; $fs=0.2;
function ldraw_lib__004589c(realsolid=false) = [
// 0 Sticker  1.1 x  1.1 with Black Telephone on White Background
// 0 Name: 004589c.dat
// 0 Author: Alex Taylor [anathema]
// 0 !LDRAW_ORG Part UPDATE 2022-04
// 0 !LICENSE Licensed under CC BY 2.0 and CC BY 4.0 : see CAreadme.txt
// 
// 0 BFC CERTIFY CCW
  [0,"BFC","CERTIFY"],
  [0,"BFC","CCW"],
// 
// 0 !KEYWORDS Set 148, Station, Train
// 
// 0 !HISTORY 2021-03-14 [RainbowDolphin] Vectorized the pattern
// 0 !HISTORY 2022-07-18 [PTadmin] Official Update 2022-04
// 
// 
// 1 16 0 -0.25 0 11 0 0 0 0.25 0 0 0 11 box5-12.dat
  [1,16,0,-0.25,0,11,0,0,0,0.25,0,0,0,11, ldraw_lib__box5_12(realsolid)],
// 1 15 0 9.75 12 1 0 0 0 0 1 0 -1 0 s\3004p13s01.dat
  [1,15,0,9.75,12,1,0,0,0,0,1,0,-1,0, ldraw_lib__s__3004p13s01(realsolid)],
];
module ldraw_lib__004589c(step=0, col=false, unit=2/5, alt=false, line=0.2, solid=!$preview)
    makepoly(ldraw_lib__004589c(solid), step=step, col=col, unit=unit, alt=alt, line=line, solid=solid);
ldraw_lib__004589c(line=0.2);
